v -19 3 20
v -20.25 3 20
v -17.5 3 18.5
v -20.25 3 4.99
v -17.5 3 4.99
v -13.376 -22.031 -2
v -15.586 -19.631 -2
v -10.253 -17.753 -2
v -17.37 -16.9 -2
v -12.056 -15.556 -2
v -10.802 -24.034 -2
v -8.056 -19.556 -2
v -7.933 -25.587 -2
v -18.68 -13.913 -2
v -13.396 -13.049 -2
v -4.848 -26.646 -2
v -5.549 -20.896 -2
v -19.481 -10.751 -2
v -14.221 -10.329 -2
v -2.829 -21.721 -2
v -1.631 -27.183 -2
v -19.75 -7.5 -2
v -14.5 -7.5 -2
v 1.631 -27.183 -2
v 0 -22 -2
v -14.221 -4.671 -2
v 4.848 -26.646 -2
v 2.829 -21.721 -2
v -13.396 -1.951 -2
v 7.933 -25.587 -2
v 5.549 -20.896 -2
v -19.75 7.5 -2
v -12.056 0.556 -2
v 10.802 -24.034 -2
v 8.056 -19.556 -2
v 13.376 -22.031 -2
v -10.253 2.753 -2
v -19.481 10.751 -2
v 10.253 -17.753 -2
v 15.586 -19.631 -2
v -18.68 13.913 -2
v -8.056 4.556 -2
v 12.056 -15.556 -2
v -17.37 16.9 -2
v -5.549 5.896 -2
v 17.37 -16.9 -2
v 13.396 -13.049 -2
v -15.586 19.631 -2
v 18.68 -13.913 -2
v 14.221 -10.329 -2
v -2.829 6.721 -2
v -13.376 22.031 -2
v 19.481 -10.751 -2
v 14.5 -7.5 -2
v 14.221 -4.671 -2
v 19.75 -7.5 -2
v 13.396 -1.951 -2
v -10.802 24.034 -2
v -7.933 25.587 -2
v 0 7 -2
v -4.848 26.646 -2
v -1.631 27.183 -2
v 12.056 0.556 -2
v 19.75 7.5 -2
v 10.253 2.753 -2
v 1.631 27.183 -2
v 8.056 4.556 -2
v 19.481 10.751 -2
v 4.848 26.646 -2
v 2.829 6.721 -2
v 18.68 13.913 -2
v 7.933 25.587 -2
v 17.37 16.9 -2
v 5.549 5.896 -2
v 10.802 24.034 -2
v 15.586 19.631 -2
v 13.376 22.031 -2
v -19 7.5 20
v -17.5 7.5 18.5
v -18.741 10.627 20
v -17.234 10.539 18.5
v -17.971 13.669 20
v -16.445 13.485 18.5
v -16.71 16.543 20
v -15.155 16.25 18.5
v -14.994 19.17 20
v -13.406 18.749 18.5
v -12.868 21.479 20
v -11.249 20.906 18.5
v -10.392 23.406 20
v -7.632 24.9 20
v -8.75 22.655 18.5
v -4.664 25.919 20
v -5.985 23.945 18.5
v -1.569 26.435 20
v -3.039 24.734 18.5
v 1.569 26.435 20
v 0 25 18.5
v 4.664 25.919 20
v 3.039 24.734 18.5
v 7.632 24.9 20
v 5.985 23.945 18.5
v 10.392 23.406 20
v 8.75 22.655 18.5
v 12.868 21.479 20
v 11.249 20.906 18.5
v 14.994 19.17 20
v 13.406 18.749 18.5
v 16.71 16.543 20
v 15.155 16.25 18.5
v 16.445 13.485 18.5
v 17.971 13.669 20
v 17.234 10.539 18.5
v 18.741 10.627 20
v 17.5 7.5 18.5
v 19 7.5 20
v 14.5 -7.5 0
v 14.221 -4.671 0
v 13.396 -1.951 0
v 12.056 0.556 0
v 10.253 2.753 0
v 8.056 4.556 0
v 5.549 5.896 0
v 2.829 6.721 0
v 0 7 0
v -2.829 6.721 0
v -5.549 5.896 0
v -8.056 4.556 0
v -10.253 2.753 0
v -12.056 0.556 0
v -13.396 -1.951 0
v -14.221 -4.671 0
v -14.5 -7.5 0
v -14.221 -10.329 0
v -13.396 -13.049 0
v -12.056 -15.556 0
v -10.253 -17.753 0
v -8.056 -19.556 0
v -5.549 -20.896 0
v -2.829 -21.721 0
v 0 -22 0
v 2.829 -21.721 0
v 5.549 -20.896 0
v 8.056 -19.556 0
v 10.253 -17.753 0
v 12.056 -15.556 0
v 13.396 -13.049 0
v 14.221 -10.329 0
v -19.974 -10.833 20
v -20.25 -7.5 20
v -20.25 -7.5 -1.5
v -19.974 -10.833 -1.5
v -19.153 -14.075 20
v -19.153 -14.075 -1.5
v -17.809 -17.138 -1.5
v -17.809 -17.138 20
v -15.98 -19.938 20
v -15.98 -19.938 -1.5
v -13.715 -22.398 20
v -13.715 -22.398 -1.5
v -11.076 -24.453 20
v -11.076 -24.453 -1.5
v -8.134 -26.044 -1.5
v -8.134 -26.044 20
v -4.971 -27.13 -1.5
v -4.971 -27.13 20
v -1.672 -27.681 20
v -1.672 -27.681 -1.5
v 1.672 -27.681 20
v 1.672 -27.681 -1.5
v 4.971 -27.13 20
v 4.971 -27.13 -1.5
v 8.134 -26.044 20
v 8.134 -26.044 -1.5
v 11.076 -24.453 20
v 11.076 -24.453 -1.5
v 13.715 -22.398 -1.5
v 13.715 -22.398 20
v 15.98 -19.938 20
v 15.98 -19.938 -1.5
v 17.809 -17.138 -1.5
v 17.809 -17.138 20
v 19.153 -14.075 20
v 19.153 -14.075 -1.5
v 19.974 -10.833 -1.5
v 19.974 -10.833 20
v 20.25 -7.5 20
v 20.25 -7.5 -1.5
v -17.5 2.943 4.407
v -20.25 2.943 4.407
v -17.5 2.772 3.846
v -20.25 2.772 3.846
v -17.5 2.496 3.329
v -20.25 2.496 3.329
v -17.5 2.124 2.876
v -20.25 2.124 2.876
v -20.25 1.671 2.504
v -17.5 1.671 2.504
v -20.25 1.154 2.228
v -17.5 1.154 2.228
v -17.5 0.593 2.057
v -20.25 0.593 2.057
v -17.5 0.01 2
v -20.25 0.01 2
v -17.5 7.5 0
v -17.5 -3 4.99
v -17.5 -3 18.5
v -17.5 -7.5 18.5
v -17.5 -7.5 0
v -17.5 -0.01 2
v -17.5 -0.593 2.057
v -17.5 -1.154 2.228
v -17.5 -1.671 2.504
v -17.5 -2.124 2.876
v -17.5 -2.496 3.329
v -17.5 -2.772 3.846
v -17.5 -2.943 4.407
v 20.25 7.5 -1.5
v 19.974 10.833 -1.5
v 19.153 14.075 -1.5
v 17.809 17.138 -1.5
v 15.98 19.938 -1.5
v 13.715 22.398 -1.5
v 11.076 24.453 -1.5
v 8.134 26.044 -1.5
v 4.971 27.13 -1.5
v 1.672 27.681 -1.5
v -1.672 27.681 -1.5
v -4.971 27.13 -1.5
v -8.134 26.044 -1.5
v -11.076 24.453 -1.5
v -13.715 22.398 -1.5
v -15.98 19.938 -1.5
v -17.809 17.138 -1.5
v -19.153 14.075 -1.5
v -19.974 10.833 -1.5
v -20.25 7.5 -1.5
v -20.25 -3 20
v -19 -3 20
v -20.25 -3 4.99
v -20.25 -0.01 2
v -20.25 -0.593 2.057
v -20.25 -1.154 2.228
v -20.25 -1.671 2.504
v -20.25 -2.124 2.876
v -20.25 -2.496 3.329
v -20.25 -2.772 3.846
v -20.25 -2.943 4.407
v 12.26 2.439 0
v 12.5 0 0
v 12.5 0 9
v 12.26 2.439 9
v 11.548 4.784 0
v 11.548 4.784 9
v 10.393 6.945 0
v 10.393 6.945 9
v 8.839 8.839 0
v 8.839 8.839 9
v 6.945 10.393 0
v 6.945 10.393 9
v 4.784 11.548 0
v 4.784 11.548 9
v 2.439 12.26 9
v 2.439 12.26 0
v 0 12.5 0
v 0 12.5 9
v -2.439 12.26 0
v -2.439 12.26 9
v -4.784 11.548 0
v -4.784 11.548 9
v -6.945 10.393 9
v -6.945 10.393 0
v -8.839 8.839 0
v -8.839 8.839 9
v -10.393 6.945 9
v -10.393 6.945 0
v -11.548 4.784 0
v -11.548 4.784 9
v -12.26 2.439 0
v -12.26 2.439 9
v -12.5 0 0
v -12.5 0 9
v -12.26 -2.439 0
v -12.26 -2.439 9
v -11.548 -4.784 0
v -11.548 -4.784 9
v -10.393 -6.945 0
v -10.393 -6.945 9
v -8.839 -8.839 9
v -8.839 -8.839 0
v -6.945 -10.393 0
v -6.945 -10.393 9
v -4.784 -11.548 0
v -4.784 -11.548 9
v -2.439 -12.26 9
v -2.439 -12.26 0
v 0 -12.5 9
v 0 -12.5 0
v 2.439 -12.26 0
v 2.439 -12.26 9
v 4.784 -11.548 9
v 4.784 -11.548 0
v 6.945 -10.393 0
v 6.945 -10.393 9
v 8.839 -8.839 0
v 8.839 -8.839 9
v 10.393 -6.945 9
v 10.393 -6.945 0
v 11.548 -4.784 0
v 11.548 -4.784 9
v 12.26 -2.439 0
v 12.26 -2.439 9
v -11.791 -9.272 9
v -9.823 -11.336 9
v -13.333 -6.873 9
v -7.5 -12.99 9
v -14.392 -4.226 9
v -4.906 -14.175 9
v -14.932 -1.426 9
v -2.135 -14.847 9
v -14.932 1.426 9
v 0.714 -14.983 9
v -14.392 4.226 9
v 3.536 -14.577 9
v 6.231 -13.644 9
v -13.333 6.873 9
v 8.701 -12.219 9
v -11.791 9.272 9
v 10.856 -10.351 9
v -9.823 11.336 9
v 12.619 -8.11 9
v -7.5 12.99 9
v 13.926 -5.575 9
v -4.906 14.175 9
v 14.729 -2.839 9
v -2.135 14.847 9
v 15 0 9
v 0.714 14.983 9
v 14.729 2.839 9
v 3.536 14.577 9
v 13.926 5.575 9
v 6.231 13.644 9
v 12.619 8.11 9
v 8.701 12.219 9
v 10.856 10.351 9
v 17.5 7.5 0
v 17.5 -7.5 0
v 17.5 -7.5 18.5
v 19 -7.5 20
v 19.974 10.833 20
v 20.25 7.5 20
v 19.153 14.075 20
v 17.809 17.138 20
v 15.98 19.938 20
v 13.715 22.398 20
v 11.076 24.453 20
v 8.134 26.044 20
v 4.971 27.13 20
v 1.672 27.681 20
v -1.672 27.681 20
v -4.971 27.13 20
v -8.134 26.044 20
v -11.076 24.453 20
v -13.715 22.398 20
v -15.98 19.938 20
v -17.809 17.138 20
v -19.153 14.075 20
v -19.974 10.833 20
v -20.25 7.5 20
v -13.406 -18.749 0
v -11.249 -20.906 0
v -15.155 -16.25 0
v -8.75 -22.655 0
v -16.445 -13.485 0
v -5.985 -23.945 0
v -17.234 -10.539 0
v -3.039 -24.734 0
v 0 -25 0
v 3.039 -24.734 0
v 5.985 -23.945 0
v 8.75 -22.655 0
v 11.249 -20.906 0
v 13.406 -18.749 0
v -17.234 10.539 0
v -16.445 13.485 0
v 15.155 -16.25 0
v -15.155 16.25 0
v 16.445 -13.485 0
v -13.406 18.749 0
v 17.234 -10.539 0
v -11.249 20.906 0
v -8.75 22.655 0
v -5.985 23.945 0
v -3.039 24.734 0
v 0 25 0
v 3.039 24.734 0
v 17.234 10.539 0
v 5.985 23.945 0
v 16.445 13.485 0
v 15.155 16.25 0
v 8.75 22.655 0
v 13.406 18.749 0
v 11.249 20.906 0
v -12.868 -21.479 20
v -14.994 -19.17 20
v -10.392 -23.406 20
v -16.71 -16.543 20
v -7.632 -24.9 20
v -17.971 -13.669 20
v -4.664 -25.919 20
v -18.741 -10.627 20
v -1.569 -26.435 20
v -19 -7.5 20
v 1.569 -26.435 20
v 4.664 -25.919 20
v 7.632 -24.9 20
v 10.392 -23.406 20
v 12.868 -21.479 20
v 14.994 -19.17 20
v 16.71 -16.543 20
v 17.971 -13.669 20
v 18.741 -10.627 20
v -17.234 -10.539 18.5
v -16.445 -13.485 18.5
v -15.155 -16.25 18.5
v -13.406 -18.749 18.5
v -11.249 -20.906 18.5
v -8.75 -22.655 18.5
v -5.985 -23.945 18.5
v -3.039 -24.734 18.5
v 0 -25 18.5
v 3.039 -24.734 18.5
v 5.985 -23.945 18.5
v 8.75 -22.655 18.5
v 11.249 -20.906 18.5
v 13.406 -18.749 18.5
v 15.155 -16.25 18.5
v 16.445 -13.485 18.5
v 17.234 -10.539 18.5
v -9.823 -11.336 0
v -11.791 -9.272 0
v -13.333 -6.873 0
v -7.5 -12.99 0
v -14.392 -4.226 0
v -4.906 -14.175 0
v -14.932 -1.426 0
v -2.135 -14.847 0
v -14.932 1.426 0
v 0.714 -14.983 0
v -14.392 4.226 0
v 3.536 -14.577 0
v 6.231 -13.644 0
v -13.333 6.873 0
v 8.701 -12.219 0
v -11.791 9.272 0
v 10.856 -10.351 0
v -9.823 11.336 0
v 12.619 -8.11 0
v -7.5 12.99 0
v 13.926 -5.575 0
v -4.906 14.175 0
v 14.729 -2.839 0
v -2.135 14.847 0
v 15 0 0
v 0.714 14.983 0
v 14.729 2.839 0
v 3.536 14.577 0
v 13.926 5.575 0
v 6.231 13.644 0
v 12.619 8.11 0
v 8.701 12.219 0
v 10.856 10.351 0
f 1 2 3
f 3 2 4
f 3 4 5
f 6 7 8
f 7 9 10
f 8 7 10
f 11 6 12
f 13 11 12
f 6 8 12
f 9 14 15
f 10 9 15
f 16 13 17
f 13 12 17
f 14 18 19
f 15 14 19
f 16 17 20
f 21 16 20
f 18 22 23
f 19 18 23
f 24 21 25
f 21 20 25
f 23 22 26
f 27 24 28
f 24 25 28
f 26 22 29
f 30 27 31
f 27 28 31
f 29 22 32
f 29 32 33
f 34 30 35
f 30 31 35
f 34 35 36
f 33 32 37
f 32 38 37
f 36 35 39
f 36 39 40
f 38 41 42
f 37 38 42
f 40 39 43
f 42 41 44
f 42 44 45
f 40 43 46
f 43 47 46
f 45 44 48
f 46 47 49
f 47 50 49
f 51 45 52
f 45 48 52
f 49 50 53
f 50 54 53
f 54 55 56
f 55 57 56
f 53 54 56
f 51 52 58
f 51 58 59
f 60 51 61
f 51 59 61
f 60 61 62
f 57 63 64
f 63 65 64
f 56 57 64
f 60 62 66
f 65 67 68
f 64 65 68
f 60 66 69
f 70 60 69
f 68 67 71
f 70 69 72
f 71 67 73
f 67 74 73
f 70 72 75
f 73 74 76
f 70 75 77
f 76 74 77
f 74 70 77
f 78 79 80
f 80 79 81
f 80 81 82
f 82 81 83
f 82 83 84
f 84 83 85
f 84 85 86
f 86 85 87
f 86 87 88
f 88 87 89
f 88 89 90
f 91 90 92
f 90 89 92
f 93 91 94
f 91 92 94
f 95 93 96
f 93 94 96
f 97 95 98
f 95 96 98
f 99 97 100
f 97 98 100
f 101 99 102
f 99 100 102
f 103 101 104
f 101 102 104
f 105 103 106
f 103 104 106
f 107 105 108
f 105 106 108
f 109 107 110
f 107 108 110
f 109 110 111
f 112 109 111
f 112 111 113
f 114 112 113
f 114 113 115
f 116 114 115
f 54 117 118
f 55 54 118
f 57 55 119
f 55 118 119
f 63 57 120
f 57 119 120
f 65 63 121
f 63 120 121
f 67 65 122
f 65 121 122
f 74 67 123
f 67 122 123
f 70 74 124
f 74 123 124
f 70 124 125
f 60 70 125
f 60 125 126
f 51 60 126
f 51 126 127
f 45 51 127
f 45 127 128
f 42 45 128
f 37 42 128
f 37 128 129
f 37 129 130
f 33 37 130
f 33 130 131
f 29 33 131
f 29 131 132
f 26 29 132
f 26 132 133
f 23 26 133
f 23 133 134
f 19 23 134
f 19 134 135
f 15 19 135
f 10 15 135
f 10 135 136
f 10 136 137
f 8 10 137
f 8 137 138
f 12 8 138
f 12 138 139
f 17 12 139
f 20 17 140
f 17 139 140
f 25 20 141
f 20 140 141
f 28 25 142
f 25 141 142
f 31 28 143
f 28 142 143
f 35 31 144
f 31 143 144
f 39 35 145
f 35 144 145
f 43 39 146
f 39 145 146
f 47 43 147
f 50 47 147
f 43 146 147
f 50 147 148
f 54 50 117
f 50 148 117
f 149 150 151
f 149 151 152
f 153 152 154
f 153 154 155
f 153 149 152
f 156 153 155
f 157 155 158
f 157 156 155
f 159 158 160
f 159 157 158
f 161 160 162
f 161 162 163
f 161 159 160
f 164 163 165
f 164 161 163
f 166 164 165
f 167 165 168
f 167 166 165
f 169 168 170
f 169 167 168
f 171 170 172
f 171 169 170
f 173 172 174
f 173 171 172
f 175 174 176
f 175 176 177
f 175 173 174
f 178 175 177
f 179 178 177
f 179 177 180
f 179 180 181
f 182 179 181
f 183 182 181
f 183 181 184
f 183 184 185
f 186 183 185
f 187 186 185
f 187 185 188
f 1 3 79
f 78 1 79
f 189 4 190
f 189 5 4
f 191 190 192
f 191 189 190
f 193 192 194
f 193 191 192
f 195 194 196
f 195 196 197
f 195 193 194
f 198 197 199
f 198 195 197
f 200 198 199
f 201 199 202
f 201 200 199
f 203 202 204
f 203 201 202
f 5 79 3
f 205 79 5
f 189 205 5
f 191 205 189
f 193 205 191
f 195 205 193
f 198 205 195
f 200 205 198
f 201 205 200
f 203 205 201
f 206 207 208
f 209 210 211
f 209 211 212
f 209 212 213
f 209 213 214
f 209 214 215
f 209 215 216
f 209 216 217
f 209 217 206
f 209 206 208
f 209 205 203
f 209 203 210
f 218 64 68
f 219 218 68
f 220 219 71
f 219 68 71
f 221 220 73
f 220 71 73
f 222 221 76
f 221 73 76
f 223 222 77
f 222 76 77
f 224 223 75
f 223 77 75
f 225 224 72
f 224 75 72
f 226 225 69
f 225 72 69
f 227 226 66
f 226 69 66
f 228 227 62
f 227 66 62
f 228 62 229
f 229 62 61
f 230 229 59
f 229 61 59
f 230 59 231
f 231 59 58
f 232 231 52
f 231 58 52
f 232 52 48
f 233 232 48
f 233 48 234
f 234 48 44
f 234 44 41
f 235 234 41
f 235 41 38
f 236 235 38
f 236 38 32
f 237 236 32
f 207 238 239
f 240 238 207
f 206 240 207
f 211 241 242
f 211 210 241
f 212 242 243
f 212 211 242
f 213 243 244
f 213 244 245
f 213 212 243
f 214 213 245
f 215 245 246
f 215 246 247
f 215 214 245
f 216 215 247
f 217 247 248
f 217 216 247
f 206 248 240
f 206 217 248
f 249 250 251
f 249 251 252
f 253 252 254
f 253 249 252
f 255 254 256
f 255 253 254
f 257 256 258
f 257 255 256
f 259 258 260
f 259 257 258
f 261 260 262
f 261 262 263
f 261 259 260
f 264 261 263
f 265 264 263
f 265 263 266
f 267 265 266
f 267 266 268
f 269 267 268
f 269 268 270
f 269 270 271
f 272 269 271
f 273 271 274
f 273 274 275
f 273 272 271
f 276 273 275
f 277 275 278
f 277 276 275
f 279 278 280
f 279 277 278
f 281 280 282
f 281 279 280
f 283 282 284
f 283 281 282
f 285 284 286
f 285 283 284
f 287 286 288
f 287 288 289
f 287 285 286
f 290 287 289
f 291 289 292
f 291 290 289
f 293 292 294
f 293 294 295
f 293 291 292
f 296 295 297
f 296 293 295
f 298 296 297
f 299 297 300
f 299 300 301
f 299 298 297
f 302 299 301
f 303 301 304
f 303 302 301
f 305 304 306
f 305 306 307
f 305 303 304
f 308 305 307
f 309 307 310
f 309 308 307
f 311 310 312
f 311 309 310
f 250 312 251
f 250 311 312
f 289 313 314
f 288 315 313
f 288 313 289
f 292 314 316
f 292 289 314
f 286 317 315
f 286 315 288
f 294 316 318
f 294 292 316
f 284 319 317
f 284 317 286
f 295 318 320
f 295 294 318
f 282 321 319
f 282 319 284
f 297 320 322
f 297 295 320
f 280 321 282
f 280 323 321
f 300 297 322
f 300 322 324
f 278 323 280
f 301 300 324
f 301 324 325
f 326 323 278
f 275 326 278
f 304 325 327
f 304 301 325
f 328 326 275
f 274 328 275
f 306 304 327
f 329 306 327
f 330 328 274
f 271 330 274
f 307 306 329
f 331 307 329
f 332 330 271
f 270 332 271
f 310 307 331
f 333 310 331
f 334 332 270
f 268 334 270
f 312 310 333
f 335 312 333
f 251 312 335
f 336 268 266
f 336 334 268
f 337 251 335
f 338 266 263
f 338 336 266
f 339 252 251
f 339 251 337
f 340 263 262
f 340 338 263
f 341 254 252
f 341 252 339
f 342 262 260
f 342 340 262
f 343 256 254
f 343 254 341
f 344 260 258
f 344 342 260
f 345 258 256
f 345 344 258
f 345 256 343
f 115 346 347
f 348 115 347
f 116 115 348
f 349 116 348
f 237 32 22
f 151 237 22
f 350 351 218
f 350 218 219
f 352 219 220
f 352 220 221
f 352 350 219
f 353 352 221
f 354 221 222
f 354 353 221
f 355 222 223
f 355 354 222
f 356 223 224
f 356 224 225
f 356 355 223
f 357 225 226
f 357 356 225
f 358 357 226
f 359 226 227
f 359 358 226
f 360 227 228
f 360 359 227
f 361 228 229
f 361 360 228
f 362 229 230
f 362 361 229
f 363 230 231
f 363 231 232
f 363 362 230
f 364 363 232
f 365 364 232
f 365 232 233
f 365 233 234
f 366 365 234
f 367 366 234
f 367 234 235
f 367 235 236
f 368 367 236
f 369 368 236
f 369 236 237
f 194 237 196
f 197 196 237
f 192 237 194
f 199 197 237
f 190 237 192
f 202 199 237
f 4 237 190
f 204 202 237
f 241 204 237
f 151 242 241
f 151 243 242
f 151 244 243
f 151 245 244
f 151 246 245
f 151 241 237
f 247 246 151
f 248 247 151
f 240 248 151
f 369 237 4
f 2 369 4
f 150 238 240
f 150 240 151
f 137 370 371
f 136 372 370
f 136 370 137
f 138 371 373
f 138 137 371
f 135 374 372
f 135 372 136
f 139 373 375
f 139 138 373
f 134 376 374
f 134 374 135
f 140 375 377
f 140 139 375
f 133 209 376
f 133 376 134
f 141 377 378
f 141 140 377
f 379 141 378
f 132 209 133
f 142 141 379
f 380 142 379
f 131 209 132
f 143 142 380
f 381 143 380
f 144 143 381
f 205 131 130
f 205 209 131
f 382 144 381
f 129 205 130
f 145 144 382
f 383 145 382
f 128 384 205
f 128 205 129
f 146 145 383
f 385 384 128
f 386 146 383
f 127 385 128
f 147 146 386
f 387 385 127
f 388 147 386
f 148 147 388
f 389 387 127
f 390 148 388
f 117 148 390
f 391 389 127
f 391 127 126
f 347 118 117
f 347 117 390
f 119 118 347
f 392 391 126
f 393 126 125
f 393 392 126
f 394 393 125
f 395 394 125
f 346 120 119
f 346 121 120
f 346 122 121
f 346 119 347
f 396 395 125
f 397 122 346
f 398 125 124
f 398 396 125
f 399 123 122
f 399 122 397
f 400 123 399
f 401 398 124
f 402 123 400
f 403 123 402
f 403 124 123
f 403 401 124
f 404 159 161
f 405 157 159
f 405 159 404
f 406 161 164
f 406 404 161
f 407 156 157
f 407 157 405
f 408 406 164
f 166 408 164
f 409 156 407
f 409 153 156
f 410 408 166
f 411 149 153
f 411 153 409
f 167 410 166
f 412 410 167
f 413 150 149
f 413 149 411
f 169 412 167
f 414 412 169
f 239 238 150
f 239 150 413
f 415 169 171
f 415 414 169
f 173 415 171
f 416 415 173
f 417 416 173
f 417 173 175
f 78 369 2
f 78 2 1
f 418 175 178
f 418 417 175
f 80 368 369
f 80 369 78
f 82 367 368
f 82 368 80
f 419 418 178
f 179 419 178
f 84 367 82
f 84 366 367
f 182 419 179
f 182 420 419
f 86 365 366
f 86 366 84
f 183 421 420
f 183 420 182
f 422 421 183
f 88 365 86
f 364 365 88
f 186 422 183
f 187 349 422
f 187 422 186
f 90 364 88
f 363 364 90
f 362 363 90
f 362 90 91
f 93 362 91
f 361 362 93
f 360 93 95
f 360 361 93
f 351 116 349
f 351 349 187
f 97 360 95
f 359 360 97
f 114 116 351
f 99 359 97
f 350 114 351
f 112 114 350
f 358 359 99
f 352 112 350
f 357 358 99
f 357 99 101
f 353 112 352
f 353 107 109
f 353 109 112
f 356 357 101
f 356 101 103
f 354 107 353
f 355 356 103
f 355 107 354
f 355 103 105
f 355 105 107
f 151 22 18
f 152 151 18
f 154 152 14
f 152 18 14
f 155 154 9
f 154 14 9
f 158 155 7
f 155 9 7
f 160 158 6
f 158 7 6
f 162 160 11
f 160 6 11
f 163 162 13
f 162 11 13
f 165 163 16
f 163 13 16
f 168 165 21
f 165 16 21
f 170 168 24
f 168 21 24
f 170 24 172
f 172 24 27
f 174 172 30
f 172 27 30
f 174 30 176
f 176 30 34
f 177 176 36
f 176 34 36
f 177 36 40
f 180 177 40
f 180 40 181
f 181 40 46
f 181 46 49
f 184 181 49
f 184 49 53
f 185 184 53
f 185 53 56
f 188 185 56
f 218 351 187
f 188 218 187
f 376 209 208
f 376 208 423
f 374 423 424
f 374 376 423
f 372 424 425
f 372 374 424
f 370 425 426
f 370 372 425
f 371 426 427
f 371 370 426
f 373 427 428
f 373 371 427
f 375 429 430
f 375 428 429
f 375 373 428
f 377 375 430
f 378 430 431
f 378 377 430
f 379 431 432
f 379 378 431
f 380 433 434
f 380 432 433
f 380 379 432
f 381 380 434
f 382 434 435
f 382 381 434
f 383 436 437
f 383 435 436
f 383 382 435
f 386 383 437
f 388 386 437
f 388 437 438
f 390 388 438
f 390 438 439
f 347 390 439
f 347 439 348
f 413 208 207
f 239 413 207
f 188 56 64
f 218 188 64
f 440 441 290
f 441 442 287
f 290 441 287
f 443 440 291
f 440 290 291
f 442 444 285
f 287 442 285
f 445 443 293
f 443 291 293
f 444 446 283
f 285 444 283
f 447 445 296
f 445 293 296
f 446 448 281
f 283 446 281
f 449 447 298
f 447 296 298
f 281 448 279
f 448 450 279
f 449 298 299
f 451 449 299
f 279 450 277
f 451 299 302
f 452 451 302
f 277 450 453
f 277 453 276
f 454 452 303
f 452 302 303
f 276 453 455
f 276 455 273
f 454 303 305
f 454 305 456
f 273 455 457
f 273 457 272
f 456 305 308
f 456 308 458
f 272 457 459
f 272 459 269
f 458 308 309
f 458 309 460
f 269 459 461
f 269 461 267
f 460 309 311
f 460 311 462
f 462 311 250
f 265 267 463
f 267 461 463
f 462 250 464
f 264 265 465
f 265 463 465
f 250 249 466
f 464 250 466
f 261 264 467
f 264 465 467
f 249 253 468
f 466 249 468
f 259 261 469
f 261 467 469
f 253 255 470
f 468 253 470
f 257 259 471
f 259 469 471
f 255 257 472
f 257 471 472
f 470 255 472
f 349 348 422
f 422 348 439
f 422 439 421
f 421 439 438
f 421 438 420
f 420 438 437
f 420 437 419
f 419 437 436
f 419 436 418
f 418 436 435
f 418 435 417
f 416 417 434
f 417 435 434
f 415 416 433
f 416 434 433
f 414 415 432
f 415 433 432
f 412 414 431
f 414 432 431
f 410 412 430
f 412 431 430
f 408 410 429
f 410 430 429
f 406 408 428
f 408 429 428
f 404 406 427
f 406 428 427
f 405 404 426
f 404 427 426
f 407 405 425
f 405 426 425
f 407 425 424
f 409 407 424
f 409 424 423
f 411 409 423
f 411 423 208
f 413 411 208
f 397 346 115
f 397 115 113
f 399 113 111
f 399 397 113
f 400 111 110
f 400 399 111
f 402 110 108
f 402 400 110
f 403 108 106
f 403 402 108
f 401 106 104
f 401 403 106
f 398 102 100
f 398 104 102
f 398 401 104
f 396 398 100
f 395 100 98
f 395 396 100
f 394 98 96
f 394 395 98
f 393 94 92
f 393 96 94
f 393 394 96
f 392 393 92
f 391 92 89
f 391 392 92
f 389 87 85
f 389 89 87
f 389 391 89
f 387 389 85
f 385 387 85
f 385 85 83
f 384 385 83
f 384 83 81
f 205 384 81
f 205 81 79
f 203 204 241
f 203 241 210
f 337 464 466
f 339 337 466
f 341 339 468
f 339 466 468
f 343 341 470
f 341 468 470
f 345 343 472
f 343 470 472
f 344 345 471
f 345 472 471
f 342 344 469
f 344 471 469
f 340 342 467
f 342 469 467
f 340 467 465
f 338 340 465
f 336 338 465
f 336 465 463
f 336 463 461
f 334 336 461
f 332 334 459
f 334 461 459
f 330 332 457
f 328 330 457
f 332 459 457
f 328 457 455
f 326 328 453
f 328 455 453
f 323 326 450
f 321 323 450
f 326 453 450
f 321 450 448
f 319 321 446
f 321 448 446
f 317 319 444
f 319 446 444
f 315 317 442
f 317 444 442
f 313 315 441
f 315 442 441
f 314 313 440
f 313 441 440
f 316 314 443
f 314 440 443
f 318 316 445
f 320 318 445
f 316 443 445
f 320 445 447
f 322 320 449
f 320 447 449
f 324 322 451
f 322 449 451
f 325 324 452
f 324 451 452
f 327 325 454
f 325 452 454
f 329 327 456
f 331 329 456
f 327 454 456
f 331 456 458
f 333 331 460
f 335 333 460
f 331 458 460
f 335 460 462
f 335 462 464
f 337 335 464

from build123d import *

# Parameters (mm, degrees)
PAD_DEPTH       = 20
PAD_DEPTH_BACK  = 2
POCKET_DEPTH    = 20.001
POCKET001_START = 2
SKETCH002_W     = 50
SKETCH002_H     = 6
POCKET001_DEPTH = 28
SKETCH003_R     = 14.5
POCKET002_DEPTH = 2.001
CHAMFER_SIZE    = 1.5
CHAMFER001_SIZE = 0.5
FILLET_R        = 2.99
SKETCH004_R     = 15
SKETCH004_R_2   = 12.5
PAD001_DEPTH    = 9


with BuildPart() as bodykappe:
    # Sketch → Pad (new body, two sides)
    with BuildSketch(Plane.XY) as pad_sk:
        with BuildLine():
            ThreePointArc((20.25, 7.5), (0, 27.75), (-20.25, 7.5))
            Line((-20.25, 7.5), (-20.25, -7.5))
            ThreePointArc((-20.25, -7.5), (0, -27.75), (20.25, -7.5))
            Line((20.25, 7.5), (20.25, -7.5))
        make_face()
    extrude(amount=PAD_DEPTH)
    extrude(pad_sk.sketch, amount=-PAD_DEPTH_BACK)

    # Sketch001 → Pocket (cut, through all)
    with BuildSketch(Plane.XY):
        with BuildLine():
            ThreePointArc((17.5, 7.5), (0, 25), (-17.5, 7.5))
            Line((-17.5, 7.5), (-17.5, -7.5))
            ThreePointArc((-17.5, -7.5), (0, -25), (17.5, -7.5))
            Line((17.5, 7.5), (17.5, -7.5))
        make_face()
    extrude(amount=POCKET_DEPTH, mode=Mode.SUBTRACT)

    # Sketch002 → Pocket001 (cut)
    with BuildSketch(Plane.XY.offset(POCKET001_START)):
        with Locations((-25, 0)):
            Rectangle(SKETCH002_W, SKETCH002_H)
    extrude(amount=POCKET001_DEPTH, mode=Mode.SUBTRACT)

    # Sketch003 → Pocket002 (cut, through all)
    with BuildSketch(Plane.XY):
        with Locations((0, -7.5)):
            Circle(SKETCH003_R)
    extrude(amount=-POCKET002_DEPTH, mode=Mode.SUBTRACT)

    # Chamfer
    chamfer_edges = [bodykappe.edges().sort_by_distance(p)[0] for p in [
        (0, 25, 20),
    ]]
    chamfer(chamfer_edges, length=CHAMFER_SIZE)

    # Chamfer001
    chamfer001_edges = [bodykappe.edges().sort_by_distance(p)[0] for p in [
        (0, -27.75, -2),
    ]]
    chamfer(chamfer001_edges, length=CHAMFER001_SIZE)

    # Fillet
    fillet_edges = [bodykappe.edges().sort_by_distance(p)[0] for p in [
        (-18.875, -3, 2),
        (-18.875, 3, 2),
    ]]
    fillet(fillet_edges, radius=FILLET_R)


with BuildPart() as bodyring:
    # Sketch004 → Pad001 (new body)
    with BuildSketch(Plane.XY):
        Circle(SKETCH004_R)
        Circle(SKETCH004_R_2, mode=Mode.SUBTRACT)
    extrude(amount=PAD001_DEPTH)


solid = Compound([bodykappe.part, bodyring.part])
